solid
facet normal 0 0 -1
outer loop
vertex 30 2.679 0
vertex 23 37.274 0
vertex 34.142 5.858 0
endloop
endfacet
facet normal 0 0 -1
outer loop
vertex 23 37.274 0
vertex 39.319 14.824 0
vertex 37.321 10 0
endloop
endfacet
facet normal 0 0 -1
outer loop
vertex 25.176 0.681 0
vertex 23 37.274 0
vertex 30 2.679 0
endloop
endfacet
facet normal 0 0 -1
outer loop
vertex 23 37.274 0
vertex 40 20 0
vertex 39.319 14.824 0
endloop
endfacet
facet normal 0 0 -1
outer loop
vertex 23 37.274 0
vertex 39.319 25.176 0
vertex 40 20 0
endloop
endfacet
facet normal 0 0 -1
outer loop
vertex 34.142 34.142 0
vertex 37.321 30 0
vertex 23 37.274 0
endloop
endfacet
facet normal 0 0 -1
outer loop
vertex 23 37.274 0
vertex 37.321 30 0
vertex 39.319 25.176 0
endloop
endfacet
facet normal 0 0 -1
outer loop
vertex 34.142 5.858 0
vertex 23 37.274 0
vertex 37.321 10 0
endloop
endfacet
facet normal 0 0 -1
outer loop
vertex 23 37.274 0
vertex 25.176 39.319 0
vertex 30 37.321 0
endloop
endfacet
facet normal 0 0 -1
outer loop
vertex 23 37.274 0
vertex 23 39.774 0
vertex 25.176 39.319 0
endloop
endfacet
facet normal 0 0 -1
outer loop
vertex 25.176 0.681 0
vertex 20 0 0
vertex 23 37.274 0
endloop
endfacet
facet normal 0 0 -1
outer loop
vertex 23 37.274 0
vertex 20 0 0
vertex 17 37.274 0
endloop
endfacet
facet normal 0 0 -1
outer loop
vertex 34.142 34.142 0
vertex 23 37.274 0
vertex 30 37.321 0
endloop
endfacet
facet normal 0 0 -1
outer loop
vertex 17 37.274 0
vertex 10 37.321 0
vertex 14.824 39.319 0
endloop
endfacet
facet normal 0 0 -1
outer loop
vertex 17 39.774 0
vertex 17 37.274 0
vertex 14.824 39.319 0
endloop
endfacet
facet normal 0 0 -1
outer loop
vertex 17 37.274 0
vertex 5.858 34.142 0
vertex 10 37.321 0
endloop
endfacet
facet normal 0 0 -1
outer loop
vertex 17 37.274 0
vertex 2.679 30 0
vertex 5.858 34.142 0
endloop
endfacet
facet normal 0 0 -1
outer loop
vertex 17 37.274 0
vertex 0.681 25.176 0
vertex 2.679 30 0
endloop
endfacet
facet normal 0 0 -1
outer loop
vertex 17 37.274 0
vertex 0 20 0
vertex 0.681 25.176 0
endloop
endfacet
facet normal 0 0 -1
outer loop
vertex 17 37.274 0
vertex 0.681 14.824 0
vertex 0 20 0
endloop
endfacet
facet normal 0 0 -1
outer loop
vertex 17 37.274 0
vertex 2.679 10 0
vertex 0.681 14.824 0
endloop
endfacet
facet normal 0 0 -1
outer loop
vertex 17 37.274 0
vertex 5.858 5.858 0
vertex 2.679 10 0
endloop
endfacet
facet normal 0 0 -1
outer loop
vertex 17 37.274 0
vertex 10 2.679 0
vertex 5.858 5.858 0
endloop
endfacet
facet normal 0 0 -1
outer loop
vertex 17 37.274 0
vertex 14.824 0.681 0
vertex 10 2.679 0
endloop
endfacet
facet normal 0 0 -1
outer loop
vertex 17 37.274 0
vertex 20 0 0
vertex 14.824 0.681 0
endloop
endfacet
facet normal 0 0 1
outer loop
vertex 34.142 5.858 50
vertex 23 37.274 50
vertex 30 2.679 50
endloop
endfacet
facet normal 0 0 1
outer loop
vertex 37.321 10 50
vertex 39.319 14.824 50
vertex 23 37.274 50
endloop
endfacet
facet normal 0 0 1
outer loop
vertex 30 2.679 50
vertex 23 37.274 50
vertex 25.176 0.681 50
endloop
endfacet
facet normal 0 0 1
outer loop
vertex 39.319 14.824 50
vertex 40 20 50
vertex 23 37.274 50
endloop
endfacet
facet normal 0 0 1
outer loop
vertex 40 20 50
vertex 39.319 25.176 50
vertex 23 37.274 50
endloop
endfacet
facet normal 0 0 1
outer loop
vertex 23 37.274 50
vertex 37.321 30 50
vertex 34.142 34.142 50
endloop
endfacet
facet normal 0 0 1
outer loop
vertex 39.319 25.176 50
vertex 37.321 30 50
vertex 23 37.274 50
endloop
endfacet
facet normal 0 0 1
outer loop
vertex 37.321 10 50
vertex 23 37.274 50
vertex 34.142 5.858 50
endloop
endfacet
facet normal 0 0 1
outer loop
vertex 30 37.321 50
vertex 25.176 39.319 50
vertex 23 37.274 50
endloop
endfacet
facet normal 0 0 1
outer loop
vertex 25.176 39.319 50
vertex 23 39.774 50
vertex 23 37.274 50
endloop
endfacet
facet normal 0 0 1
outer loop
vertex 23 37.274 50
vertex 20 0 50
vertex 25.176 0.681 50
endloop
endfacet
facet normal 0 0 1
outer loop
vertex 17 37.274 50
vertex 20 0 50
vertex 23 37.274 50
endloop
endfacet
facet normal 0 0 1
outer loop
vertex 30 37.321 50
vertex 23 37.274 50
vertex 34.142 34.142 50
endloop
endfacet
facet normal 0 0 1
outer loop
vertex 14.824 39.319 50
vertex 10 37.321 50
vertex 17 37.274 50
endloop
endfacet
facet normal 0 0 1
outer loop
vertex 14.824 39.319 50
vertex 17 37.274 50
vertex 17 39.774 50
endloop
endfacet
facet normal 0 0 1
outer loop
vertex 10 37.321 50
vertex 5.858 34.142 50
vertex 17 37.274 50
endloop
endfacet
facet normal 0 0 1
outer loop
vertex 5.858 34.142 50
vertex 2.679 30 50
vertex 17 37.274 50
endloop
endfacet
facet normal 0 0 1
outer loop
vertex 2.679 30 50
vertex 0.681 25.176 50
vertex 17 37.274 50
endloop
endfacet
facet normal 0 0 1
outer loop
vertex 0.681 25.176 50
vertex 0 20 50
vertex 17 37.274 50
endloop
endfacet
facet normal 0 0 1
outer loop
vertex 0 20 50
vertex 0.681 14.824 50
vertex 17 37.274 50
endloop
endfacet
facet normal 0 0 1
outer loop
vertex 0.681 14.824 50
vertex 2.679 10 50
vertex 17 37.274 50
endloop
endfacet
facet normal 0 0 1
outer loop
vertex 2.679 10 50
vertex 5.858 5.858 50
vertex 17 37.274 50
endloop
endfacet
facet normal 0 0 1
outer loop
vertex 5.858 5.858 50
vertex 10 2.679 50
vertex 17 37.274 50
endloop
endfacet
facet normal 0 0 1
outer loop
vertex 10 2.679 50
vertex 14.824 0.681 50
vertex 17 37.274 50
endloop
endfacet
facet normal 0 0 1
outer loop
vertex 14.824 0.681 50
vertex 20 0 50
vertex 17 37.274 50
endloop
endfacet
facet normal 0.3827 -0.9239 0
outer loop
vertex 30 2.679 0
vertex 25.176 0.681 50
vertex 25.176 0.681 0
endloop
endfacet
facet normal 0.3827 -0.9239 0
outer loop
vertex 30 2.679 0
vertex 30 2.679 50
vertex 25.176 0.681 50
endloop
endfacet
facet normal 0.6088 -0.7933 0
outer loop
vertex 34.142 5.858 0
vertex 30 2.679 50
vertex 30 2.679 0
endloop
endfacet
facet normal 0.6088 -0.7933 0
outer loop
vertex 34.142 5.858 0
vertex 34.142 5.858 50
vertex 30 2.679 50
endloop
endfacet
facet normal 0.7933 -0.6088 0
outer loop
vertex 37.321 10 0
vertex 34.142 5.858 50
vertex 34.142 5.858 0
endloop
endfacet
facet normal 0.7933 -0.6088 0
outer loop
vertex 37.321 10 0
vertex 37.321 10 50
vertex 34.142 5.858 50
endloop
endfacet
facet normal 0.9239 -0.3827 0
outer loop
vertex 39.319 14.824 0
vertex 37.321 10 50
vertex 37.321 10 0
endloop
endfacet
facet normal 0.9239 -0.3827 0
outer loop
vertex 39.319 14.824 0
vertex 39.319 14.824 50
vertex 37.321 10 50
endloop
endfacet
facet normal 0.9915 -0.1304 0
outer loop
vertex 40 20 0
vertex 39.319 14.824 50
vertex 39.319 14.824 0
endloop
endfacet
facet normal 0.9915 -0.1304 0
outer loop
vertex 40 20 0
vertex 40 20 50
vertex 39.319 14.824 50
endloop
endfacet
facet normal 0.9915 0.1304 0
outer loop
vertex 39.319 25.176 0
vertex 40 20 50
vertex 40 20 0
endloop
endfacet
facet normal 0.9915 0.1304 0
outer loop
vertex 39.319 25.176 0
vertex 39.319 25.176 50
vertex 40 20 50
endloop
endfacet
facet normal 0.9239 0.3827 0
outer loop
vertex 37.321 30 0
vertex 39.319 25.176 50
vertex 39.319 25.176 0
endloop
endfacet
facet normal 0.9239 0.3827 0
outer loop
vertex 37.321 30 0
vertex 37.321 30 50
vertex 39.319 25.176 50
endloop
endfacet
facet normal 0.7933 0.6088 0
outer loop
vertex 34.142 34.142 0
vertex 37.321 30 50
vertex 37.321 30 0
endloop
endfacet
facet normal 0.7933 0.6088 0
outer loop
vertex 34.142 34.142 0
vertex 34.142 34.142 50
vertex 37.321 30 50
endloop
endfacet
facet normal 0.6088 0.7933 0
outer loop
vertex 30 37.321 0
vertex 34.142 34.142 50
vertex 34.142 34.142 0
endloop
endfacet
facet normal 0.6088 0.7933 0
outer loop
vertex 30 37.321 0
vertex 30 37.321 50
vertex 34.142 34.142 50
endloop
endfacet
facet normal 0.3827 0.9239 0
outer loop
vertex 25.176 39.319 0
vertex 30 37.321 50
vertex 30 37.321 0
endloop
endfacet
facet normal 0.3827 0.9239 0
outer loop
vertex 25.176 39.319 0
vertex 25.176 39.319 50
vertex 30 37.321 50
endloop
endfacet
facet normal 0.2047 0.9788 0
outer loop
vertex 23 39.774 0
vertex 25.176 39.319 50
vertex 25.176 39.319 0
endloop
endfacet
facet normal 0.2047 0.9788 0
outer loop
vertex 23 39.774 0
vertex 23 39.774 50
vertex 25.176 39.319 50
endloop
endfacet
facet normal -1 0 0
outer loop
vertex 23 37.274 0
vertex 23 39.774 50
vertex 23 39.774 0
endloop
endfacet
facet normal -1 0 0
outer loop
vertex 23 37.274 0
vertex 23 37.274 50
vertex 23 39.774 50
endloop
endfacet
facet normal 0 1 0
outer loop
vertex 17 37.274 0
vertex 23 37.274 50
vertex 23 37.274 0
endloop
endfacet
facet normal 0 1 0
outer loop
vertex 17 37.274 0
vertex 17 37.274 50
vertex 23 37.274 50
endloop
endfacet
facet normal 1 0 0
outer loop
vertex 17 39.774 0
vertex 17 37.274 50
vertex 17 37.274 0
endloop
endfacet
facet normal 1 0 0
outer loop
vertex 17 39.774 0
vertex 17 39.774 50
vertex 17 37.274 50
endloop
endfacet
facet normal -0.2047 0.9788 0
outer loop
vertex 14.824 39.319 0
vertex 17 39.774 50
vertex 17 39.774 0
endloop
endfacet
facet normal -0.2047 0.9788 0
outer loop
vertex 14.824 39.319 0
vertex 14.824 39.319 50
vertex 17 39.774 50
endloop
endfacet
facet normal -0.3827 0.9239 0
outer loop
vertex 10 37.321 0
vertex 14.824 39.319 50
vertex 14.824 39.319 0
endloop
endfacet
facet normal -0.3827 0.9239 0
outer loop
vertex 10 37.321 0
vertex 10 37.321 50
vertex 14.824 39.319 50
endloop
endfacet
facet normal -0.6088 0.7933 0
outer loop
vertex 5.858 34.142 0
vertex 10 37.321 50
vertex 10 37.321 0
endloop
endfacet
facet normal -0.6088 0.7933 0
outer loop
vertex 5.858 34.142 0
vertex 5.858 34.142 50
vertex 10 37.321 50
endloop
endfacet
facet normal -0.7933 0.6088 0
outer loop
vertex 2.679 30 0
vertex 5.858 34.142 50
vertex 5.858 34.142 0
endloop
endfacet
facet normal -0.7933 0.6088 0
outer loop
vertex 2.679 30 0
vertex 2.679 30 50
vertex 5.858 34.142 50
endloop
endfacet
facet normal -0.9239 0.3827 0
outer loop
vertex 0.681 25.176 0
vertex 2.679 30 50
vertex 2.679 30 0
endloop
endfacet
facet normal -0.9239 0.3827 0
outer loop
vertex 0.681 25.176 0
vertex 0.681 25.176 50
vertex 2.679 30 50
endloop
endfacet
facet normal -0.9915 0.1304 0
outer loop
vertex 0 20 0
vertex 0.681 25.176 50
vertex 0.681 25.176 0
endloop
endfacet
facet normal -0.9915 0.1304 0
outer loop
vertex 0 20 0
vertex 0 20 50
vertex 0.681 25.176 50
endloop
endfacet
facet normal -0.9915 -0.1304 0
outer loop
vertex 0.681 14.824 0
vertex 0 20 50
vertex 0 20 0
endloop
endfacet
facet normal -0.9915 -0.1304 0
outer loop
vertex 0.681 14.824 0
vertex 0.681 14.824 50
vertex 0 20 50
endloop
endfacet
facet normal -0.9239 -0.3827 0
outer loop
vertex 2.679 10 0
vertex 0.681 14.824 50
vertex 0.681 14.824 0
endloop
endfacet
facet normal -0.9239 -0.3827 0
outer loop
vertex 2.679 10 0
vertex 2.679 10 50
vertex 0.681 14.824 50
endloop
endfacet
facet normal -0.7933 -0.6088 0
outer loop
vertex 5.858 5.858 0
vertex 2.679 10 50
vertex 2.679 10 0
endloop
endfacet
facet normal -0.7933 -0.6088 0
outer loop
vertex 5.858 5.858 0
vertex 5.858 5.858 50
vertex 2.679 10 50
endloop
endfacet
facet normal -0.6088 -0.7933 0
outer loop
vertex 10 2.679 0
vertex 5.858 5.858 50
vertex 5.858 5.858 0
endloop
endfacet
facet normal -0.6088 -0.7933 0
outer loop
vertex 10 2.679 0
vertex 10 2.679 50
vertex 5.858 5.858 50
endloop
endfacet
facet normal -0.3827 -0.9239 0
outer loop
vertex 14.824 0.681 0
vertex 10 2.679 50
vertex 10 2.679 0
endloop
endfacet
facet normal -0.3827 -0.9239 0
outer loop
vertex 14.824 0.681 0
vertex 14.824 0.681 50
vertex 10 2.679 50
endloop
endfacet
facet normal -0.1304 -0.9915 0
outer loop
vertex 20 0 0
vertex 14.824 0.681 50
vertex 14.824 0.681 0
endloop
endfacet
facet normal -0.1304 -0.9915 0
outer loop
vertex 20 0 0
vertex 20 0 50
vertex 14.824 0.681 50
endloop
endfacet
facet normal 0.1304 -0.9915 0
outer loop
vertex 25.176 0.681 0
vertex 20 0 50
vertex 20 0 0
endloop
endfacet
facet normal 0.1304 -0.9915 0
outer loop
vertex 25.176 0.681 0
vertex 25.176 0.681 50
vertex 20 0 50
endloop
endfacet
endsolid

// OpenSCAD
$fn = 32;

// ----------------------------------------------------------------------
// Keyway shaft: d40 shaft, key 6 x 2.5 mm
// ----------------------------------------------------------------------

// --- parameters (mm) ---
shaft_r = 20;             // shaft radius
key_w = 6;                // keyway width
key_d = 2.5;              // keyway depth below the surface line
plate_t = 50;             // shaft length, Z (extrusion height)
fit_tol = 0.1;            // declared fit tolerance (prompt contract)
free_tol = 0.3;           // declared free tolerance (prompt contract)

shaft_d = 2 * shaft_r;  // shaft diameter
circle_step = 15;  // polygon sampling step, degrees

profile = [[14.824, 39.319], [10, 37.321], [5.858, 34.142], [2.679, 30], [0.681, 25.176], [0, 20], [0.681, 14.824], [2.679, 10], [5.858, 5.858], [10, 2.679], [14.824, 0.681], [20, 0], [25.176, 0.681], [30, 2.679], [34.142, 5.858], [37.321, 10], [39.319, 14.824], [40, 20], [39.319, 25.176], [37.321, 30], [34.142, 34.142], [30, 37.321], [25.176, 39.319], [23, 39.774], [23, 37.274], [17, 37.274], [17, 39.774]];  // primary outline, 27 points, counter clockwise

// --- the one profile operation ---
linear_extrude(height = plate_t) polygon(points = profile);
